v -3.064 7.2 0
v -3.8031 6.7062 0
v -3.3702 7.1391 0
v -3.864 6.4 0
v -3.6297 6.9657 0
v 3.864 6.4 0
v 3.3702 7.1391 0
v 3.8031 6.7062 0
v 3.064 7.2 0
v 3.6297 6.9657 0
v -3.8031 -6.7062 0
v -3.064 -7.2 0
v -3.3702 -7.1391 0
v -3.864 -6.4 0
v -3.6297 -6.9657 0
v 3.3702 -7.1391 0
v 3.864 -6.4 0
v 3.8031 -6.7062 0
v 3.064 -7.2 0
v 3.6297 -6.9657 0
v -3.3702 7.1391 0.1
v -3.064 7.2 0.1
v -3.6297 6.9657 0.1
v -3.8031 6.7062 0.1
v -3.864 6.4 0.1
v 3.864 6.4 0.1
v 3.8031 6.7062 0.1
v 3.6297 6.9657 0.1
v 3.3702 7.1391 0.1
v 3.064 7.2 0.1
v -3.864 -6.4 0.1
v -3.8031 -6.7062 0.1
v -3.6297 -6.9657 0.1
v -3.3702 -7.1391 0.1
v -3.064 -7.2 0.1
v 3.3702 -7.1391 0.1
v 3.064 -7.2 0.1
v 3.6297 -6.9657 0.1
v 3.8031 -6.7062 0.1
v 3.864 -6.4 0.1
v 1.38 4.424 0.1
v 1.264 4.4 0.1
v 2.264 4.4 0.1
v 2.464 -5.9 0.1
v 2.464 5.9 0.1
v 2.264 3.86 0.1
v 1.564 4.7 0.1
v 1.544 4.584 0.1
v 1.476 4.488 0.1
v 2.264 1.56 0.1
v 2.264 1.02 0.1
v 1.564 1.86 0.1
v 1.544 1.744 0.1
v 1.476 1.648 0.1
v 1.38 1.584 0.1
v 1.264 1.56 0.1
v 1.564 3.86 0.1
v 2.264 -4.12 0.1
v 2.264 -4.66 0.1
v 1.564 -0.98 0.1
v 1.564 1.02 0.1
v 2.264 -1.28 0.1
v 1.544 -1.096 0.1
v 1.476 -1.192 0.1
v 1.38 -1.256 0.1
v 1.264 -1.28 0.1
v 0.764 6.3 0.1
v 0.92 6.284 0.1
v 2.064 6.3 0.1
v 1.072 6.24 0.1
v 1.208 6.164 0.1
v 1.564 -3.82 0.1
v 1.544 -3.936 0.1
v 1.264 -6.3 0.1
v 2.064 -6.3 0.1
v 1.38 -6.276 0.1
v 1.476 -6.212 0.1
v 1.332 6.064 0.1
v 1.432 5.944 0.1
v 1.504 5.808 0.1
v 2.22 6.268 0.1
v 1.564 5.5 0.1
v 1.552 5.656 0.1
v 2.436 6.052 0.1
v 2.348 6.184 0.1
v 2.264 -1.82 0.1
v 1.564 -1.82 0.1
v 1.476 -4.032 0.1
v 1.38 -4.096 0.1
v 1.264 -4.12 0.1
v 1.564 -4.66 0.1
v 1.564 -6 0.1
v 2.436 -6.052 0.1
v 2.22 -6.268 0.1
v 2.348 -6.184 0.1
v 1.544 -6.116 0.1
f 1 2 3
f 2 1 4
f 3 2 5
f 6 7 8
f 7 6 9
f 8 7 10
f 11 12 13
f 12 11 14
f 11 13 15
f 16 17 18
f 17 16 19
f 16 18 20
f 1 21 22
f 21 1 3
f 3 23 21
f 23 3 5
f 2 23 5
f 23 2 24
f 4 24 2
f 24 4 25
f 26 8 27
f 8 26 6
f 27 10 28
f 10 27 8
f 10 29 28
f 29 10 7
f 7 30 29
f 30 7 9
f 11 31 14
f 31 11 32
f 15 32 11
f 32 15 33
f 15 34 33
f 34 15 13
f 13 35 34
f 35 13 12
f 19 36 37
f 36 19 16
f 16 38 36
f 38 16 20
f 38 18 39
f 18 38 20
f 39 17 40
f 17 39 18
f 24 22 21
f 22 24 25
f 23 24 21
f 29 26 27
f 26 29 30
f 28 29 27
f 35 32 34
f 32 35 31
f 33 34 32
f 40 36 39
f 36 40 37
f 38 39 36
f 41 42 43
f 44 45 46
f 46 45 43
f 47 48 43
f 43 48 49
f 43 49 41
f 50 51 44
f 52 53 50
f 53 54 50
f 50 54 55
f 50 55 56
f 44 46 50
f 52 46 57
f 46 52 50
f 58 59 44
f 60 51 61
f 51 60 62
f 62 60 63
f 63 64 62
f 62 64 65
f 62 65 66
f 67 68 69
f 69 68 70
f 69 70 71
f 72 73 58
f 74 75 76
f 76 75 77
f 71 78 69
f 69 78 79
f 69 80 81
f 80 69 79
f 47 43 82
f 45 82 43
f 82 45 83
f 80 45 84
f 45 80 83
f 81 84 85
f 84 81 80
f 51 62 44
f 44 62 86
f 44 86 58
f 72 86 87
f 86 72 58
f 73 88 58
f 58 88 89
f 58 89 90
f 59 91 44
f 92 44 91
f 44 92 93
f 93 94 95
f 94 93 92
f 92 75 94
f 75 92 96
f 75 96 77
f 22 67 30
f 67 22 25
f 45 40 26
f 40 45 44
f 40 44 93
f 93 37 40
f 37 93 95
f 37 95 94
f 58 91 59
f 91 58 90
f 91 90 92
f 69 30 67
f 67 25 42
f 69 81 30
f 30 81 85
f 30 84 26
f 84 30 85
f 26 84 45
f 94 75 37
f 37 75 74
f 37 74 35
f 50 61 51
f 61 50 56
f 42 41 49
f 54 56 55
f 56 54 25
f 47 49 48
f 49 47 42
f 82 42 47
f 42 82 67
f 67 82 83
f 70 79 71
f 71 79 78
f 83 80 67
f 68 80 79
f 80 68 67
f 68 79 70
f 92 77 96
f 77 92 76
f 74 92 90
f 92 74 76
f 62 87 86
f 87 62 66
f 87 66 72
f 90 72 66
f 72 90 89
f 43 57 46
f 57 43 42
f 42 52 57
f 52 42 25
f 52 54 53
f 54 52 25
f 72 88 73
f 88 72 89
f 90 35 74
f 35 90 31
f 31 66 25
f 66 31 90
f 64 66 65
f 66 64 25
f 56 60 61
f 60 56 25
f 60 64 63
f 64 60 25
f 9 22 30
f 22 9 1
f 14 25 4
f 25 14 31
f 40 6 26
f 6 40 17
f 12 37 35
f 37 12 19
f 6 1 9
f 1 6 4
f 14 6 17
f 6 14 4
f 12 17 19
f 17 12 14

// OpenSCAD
// file: ../p/4-4edge.scad
use <../lib.scad>
$fa=1; $fs=0.2;
function ldraw_lib__4_4edge(realsolid=false) = [
// 0 Circle 1.0
// 0 Name: 4-4edge.dat
// 0 Author: James Jessiman
// 0 !LDRAW_ORG Primitive UPDATE 2017-01
// 0 !LICENSE Licensed under CC BY 2.0 and CC BY 4.0 : see CAreadme.txt
// 
// 0 BFC CERTIFY CCW
  [0,"BFC","CERTIFY"],
  [0,"BFC","CCW"],
// 
// 0 !HISTORY 1998-12-15 [PTadmin] Official Update 1998-10
// 0 !HISTORY 2005-12-28 [PTadmin] Official Update 2005-01
// 0 !HISTORY 2007-06-24 [PTadmin] Header formatted for Contributor Agreement
// 0 !HISTORY 2008-07-01 [PTadmin] Official Update 2008-01
// 0 !HISTORY 2017-01-15 [Steffen] BFCed
// 0 !HISTORY 2017-12-30 [PTadmin] Official Update 2017-01
// 
// 
// 2 24 1 0 0 0.9239 0 0.3827
  [2,24,1,0,0,0.9239,0,0.3827],
// 2 24 0.9239 0 0.3827 0.7071 0 0.7071
  [2,24,0.9239,0,0.3827,0.7071,0,0.7071],
// 2 24 0.7071 0 0.7071 0.3827 0 0.9239
  [2,24,0.7071,0,0.7071,0.3827,0,0.9239],
// 2 24 0.3827 0 0.9239 0 0 1
  [2,24,0.3827,0,0.9239,0,0,1],
// 2 24 0 0 1 -0.3827 0 0.9239
  [2,24,0,0,1,-0.3827,0,0.9239],
// 2 24 -0.3827 0 0.9239 -0.7071 0 0.7071
  [2,24,-0.3827,0,0.9239,-0.7071,0,0.7071],
// 2 24 -0.7071 0 0.7071 -0.9239 0 0.3827
  [2,24,-0.7071,0,0.7071,-0.9239,0,0.3827],
// 2 24 -0.9239 0 0.3827 -1 0 -0
  [2,24,-0.9239,0,0.3827,-1,0,-0],
// 2 24 -1 0 -0 -0.9239 0 -0.3827
  [2,24,-1,0,-0,-0.9239,0,-0.3827],
// 2 24 -0.9239 0 -0.3827 -0.7071 0 -0.7071
  [2,24,-0.9239,0,-0.3827,-0.7071,0,-0.7071],
// 2 24 -0.7071 0 -0.7071 -0.3827 0 -0.9239
  [2,24,-0.7071,0,-0.7071,-0.3827,0,-0.9239],
// 2 24 -0.3827 0 -0.9239 0 0 -1
  [2,24,-0.3827,0,-0.9239,0,0,-1],
// 2 24 0 0 -1 0.3827 0 -0.9239
  [2,24,0,0,-1,0.3827,0,-0.9239],
// 2 24 0.3827 0 -0.9239 0.7071 0 -0.7071
  [2,24,0.3827,0,-0.9239,0.7071,0,-0.7071],
// 2 24 0.7071 0 -0.7071 0.9239 0 -0.3827
  [2,24,0.7071,0,-0.7071,0.9239,0,-0.3827],
// 2 24 0.9239 0 -0.3827 1 0 0
  [2,24,0.9239,0,-0.3827,1,0,0],
];
module ldraw_lib__4_4edge(step=0, col=false, unit=2/5, alt=false, line=0.2, solid=!$preview)
    makepoly(ldraw_lib__4_4edge(solid), step=step, col=col, unit=unit, alt=alt, line=line, solid=solid);
ldraw_lib__4_4edge(line=0.2);
// file: ../p/4-4disc.scad
use <../lib.scad>
$fa=1; $fs=0.2;
function ldraw_lib__4_4disc(realsolid=false) = [
// 0 Disc 1.0
// 0 Name: 4-4disc.dat
// 0 Author: James Jessiman
// 0 !LDRAW_ORG Primitive UPDATE 2002-02
// 0 !LICENSE Licensed under CC BY 2.0 and CC BY 4.0 : see CAreadme.txt
// 
// 0 BFC CERTIFY CCW
  [0,"BFC","CERTIFY"],
  [0,"BFC","CCW"],
// 
// 0 !HISTORY 1998-12-15 [PTadmin] Official Update 1998-10
// 0 !HISTORY 2002-03-23 [sbliss] Added BFC statement
// 0 !HISTORY 2002-04-25 [PTadmin] Official Update 2002-02
// 0 !HISTORY 2007-06-24 [PTadmin] Header formatted for Contributor Agreement
// 0 !HISTORY 2008-07-01 [PTadmin] Official Update 2008-01
// 
// 
// 3 16 0 0 0 1 0 0 0.9239 0 0.3827
  [3,16,0,0,0,1,0,0,0.9239,0,0.3827],
// 3 16 0 0 0 0.9239 0 0.3827 0.7071 0 0.7071
  [3,16,0,0,0,0.9239,0,0.3827,0.7071,0,0.7071],
// 3 16 0 0 0 0.7071 0 0.7071 0.3827 0 0.9239
  [3,16,0,0,0,0.7071,0,0.7071,0.3827,0,0.9239],
// 3 16 0 0 0 0.3827 0 0.9239 0 0 1
  [3,16,0,0,0,0.3827,0,0.9239,0,0,1],
// 3 16 0 0 0 0 0 1 -0.3827 0 0.9239
  [3,16,0,0,0,0,0,1,-0.3827,0,0.9239],
// 3 16 0 0 0 -0.3827 0 0.9239 -0.7071 0 0.7071
  [3,16,0,0,0,-0.3827,0,0.9239,-0.7071,0,0.7071],
// 3 16 0 0 0 -0.7071 0 0.7071 -0.9239 0 0.3827
  [3,16,0,0,0,-0.7071,0,0.7071,-0.9239,0,0.3827],
// 3 16 0 0 0 -0.9239 0 0.3827 -1 0 -0
  [3,16,0,0,0,-0.9239,0,0.3827,-1,0,-0],
// 3 16 0 0 0 -1 0 -0 -0.9239 0 -0.3827
  [3,16,0,0,0,-1,0,-0,-0.9239,0,-0.3827],
// 3 16 0 0 0 -0.9239 0 -0.3827 -0.7071 0 -0.7071
  [3,16,0,0,0,-0.9239,0,-0.3827,-0.7071,0,-0.7071],
// 3 16 0 0 0 -0.7071 0 -0.7071 -0.3827 0 -0.9239
  [3,16,0,0,0,-0.7071,0,-0.7071,-0.3827,0,-0.9239],
// 3 16 0 0 0 -0.3827 0 -0.9239 0 0 -1
  [3,16,0,0,0,-0.3827,0,-0.9239,0,0,-1],
// 3 16 0 0 0 0 0 -1 0.3827 0 -0.9239
  [3,16,0,0,0,0,0,-1,0.3827,0,-0.9239],
// 3 16 0 0 0 0.3827 0 -0.9239 0.7071 0 -0.7071
  [3,16,0,0,0,0.3827,0,-0.9239,0.7071,0,-0.7071],
// 3 16 0 0 0 0.7071 0 -0.7071 0.9239 0 -0.3827
  [3,16,0,0,0,0.7071,0,-0.7071,0.9239,0,-0.3827],
// 3 16 0 0 0 0.9239 0 -0.3827 1 0 0
  [3,16,0,0,0,0.9239,0,-0.3827,1,0,0],
// 0
];
module ldraw_lib__4_4disc(step=0, col=false, unit=2/5, alt=false, line=0.2, solid=!$preview)
    makepoly(ldraw_lib__4_4disc(solid), step=step, col=col, unit=unit, alt=alt, line=line, solid=solid);
ldraw_lib__4_4disc(line=0.2);
// file: ../p/4-4cyli.scad
use <../lib.scad>
$fa=1; $fs=0.2;
function ldraw_lib__4_4cyli(realsolid=false) = [
// 0 Cylinder 1.0
// 0 Name: 4-4cyli.dat
// 0 Author: James Jessiman
// 0 !LDRAW_ORG Primitive UPDATE 2005-01
// 0 !LICENSE Licensed under CC BY 2.0 and CC BY 4.0 : see CAreadme.txt
// 
// 0 BFC CERTIFY CCW
  [0,"BFC","CERTIFY"],
  [0,"BFC","CCW"],
// 
// 0 !HISTORY 1998-12-15 [PTadmin] Official Update 1998-10
// 0 !HISTORY 2002-03-23 [sbliss] Added BFC statement; merged headers from files in distributions LDraw 0.27 and Complete.
// 0 !HISTORY 2002-04-25 [PTadmin] Official Update 2002-02
// 0 !HISTORY 2004-12-14 [guyvivan] BFC CCW
// 0 !HISTORY 2005-12-28 [PTadmin] Official Update 2005-01
// 0 !HISTORY 2007-06-24 [PTadmin] Header formatted for Contributor Agreement
// 0 !HISTORY 2008-07-01 [PTadmin] Official Update 2008-01
// 
// 
// 4 16 1 1 0 0.9239 1 0.3827 0.9239 0 0.3827 1 0 0
  [4,16,1,1,0,0.9239,1,0.3827,0.9239,0,0.3827,1,0,0],
// 5 24 1 0 0 1 1 0 0.9239 0 0.3827 0.9239 0 -0.3827
  [5,24,1,0,0,1,1,0,0.9239,0,0.3827,0.9239,0,-0.3827],
// 4 16 0.9239 1 0.3827 0.7071 1 0.7071 0.7071 0 0.7071 0.9239 0 0.3827
  [4,16,0.9239,1,0.3827,0.7071,1,0.7071,0.7071,0,0.7071,0.9239,0,0.3827],
// 5 24 0.9239 0 0.3827 0.9239 1 0.3827 0.7071 0 0.7071 1 0 0
  [5,24,0.9239,0,0.3827,0.9239,1,0.3827,0.7071,0,0.7071,1,0,0],
// 4 16 0.7071 1 0.7071 0.3827 1 0.9239 0.3827 0 0.9239 0.7071 0 0.7071
  [4,16,0.7071,1,0.7071,0.3827,1,0.9239,0.3827,0,0.9239,0.7071,0,0.7071],
// 5 24 0.7071 0 0.7071 0.7071 1 0.7071 0.3827 0 0.9239 0.9239 0 0.3827
  [5,24,0.7071,0,0.7071,0.7071,1,0.7071,0.3827,0,0.9239,0.9239,0,0.3827],
// 4 16 0.3827 1 0.9239 0 1 1 0 0 1 0.3827 0 0.9239
  [4,16,0.3827,1,0.9239,0,1,1,0,0,1,0.3827,0,0.9239],
// 5 24 0.3827 0 0.9239 0.3827 1 0.9239 0 0 1 0.7071 0 0.7071
  [5,24,0.3827,0,0.9239,0.3827,1,0.9239,0,0,1,0.7071,0,0.7071],
// 4 16 0 1 1 -0.3827 1 0.9239 -0.3827 0 0.9239 0 0 1
  [4,16,0,1,1,-0.3827,1,0.9239,-0.3827,0,0.9239,0,0,1],
// 5 24 0 0 1 0 1 1 -0.3827 0 0.9239 0.3827 0 0.9239
  [5,24,0,0,1,0,1,1,-0.3827,0,0.9239,0.3827,0,0.9239],
// 4 16 -0.3827 1 0.9239 -0.7071 1 0.7071 -0.7071 0 0.7071 -0.3827 0 0.9239
  [4,16,-0.3827,1,0.9239,-0.7071,1,0.7071,-0.7071,0,0.7071,-0.3827,0,0.9239],
// 5 24 -0.3827 0 0.9239 -0.3827 1 0.9239 -0.7071 0 0.7071 0 0 1
  [5,24,-0.3827,0,0.9239,-0.3827,1,0.9239,-0.7071,0,0.7071,0,0,1],
// 4 16 -0.7071 1 0.7071 -0.9239 1 0.3827 -0.9239 0 0.3827 -0.7071 0 0.7071
  [4,16,-0.7071,1,0.7071,-0.9239,1,0.3827,-0.9239,0,0.3827,-0.7071,0,0.7071],
// 5 24 -0.7071 0 0.7071 -0.7071 1 0.7071 -0.9239 0 0.3827 -0.3827 0 0.9239
  [5,24,-0.7071,0,0.7071,-0.7071,1,0.7071,-0.9239,0,0.3827,-0.3827,0,0.9239],
// 4 16 -0.9239 1 0.3827 -1 1 0 -1 0 0 -0.9239 0 0.3827
  [4,16,-0.9239,1,0.3827,-1,1,0,-1,0,0,-0.9239,0,0.3827],
// 5 24 -0.9239 0 0.3827 -0.9239 1 0.3827 -1 0 0 -0.7071 0 0.7071
  [5,24,-0.9239,0,0.3827,-0.9239,1,0.3827,-1,0,0,-0.7071,0,0.7071],
// 4 16 -1 1 0 -0.9239 1 -0.3827 -0.9239 0 -0.3827 -1 0 0
  [4,16,-1,1,0,-0.9239,1,-0.3827,-0.9239,0,-0.3827,-1,0,0],
// 5 24 -1 0 0 -1 1 0 -0.9239 0 -0.3827 -0.9239 0 0.3827
  [5,24,-1,0,0,-1,1,0,-0.9239,0,-0.3827,-0.9239,0,0.3827],
// 4 16 -0.9239 1 -0.3827 -0.7071 1 -0.7071 -0.7071 0 -0.7071 -0.9239 0 -0.3827
  [4,16,-0.9239,1,-0.3827,-0.7071,1,-0.7071,-0.7071,0,-0.7071,-0.9239,0,-0.3827],
// 5 24 -0.9239 0 -0.3827 -0.9239 1 -0.3827 -0.7071 0 -0.7071 -1 0 0
  [5,24,-0.9239,0,-0.3827,-0.9239,1,-0.3827,-0.7071,0,-0.7071,-1,0,0],
// 4 16 -0.7071 1 -0.7071 -0.3827 1 -0.9239 -0.3827 0 -0.9239 -0.7071 0 -0.7071
  [4,16,-0.7071,1,-0.7071,-0.3827,1,-0.9239,-0.3827,0,-0.9239,-0.7071,0,-0.7071],
// 5 24 -0.7071 0 -0.7071 -0.7071 1 -0.7071 -0.3827 0 -0.9239 -0.9239 0 -0.3827
  [5,24,-0.7071,0,-0.7071,-0.7071,1,-0.7071,-0.3827,0,-0.9239,-0.9239,0,-0.3827],
// 4 16 -0.3827 1 -0.9239 0 1 -1 0 0 -1 -0.3827 0 -0.9239
  [4,16,-0.3827,1,-0.9239,0,1,-1,0,0,-1,-0.3827,0,-0.9239],
// 5 24 -0.3827 0 -0.9239 -0.3827 1 -0.9239 0 0 -1 -0.7071 0 -0.7071
  [5,24,-0.3827,0,-0.9239,-0.3827,1,-0.9239,0,0,-1,-0.7071,0,-0.7071],
// 4 16 0 1 -1 0.3827 1 -0.9239 0.3827 0 -0.9239 0 0 -1
  [4,16,0,1,-1,0.3827,1,-0.9239,0.3827,0,-0.9239,0,0,-1],
// 5 24 0 0 -1 0 1 -1 0.3827 0 -0.9239 -0.3827 0 -0.9239
  [5,24,0,0,-1,0,1,-1,0.3827,0,-0.9239,-0.3827,0,-0.9239],
// 4 16 0.3827 1 -0.9239 0.7071 1 -0.7071 0.7071 0 -0.7071 0.3827 0 -0.9239
  [4,16,0.3827,1,-0.9239,0.7071,1,-0.7071,0.7071,0,-0.7071,0.3827,0,-0.9239],
// 5 24 0.3827 0 -0.9239 0.3827 1 -0.9239 0.7071 0 -0.7071 0 0 -1
  [5,24,0.3827,0,-0.9239,0.3827,1,-0.9239,0.7071,0,-0.7071,0,0,-1],
// 4 16 0.7071 1 -0.7071 0.9239 1 -0.3827 0.9239 0 -0.3827 0.7071 0 -0.7071
  [4,16,0.7071,1,-0.7071,0.9239,1,-0.3827,0.9239,0,-0.3827,0.7071,0,-0.7071],
// 5 24 0.7071 0 -0.7071 0.7071 1 -0.7071 0.9239 0 -0.3827 0.3827 0 -0.9239
  [5,24,0.7071,0,-0.7071,0.7071,1,-0.7071,0.9239,0,-0.3827,0.3827,0,-0.9239],
// 4 16 0.9239 1 -0.3827 1 1 0 1 0 0 0.9239 0 -0.3827
  [4,16,0.9239,1,-0.3827,1,1,0,1,0,0,0.9239,0,-0.3827],
// 5 24 0.9239 0 -0.3827 0.9239 1 -0.3827 1 0 0 0.7071 0 -0.7071
  [5,24,0.9239,0,-0.3827,0.9239,1,-0.3827,1,0,0,0.7071,0,-0.7071],
// 0
];
module ldraw_lib__4_4cyli(step=0, col=false, unit=2/5, alt=false, line=0.2, solid=!$preview)
    makepoly(ldraw_lib__4_4cyli(solid), step=step, col=col, unit=unit, alt=alt, line=line, solid=solid);
ldraw_lib__4_4cyli(line=0.2);
// file: ../p/stud3.scad
use <../lib.scad>
use <4-4cyli.scad>
use <4-4disc.scad>
use <4-4edge.scad>
$fa=1; $fs=0.2;
function ldraw_lib__stud3(realsolid=false) = realsolid ? 
    [openscad(translate([0,0,-eps()], o=cylinder(4+eps(), r=4)),2)] : [
// 0 Stud Tube Solid
// 0 Name: stud3.dat
// 0 Author: James Jessiman
// 0 !LDRAW_ORG Primitive UPDATE 2012-01
// 0 !LICENSE Licensed under CC BY 2.0 and CC BY 4.0 : see CAreadme.txt
// 
// 0 BFC CERTIFY CCW
  [0,"BFC","CERTIFY"],
  [0,"BFC","CCW"],
// 
// 0 !HISTORY 2002-04-04 [sbliss] Modified for BFC compliance
// 0 !HISTORY 2002-04-25 [PTadmin] Official Update 2002-02
// 0 !HISTORY 2007-06-24 [PTadmin] Header formatted for Contributor Agreement
// 0 !HISTORY 2008-07-01 [PTadmin] Official Update 2008-01
// 0 !HISTORY 2012-02-16 [Philo] Changed to CCW
// 0 !HISTORY 2012-03-30 [PTadmin] Official Update 2012-01
// 
// 
// 1 16 0 -4 0 4 0 0 0 1 0 0 0 4 4-4edge.dat
  [1,16,0,-4,0,4,0,0,0,1,0,0,0,4, ldraw_lib__4_4edge(realsolid)],
// 1 16 0 0 0 4 0 0 0 1 0 0 0 4 4-4edge.dat
  [1,16,0,0,0,4,0,0,0,1,0,0,0,4, ldraw_lib__4_4edge(realsolid)],
// 1 16 0 -4 0 4 0 0 0 1 0 0 0 4 4-4disc.dat
  [1,16,0,-4,0,4,0,0,0,1,0,0,0,4, ldraw_lib__4_4disc(realsolid)],
// 1 16 0 -4 0 4 0 0 0 4 0 0 0 4 4-4cyli.dat
  [1,16,0,-4,0,4,0,0,0,4,0,0,0,4, ldraw_lib__4_4cyli(realsolid)],
];
module ldraw_lib__stud3(step=0, col=false, unit=2/5, alt=false, line=0.2, solid=!$preview)
    makepoly(ldraw_lib__stud3(solid), step=step, col=col, unit=unit, alt=alt, line=line, solid=solid);
ldraw_lib__stud3(line=0.2);
// file: ../p/stud.scad
use <../lib.scad>
use <4-4cyli.scad>
use <4-4disc.scad>
use <4-4edge.scad>
$fa=1; $fs=0.2;
function ldraw_lib__stud(realsolid=false) = realsolid ? 
    [openscad(translate([0,0,-eps()], o=cylinder(4+eps(), r=6)),2)] : [
// 0 Stud
// 0 Name: stud.dat
// 0 Author: James Jessiman
// 0 !LDRAW_ORG Primitive UPDATE 2012-01
// 0 !LICENSE Licensed under CC BY 2.0 and CC BY 4.0 : see CAreadme.txt
// 
// 0 BFC CERTIFY CCW
  [0,"BFC","CERTIFY"],
  [0,"BFC","CCW"],
// 
// 0 !HISTORY 2002-04-04 [sbliss] Modified for BFC compliance
// 0 !HISTORY 2002-04-25 [PTadmin] Official Update 2002-02
// 0 !HISTORY 2007-06-24 [PTadmin] Header formatted for Contributor Agreement
// 0 !HISTORY 2008-07-01 [PTadmin] Official Update 2008-01
// 0 !HISTORY 2012-02-16 [Philo] Changed to CCW
// 0 !HISTORY 2012-03-30 [PTadmin] Official Update 2012-01
// 
// 
// 1 16 0 0 0 6 0 0 0 1 0 0 0 6 4-4edge.dat
  [1,16,0,0,0,6,0,0,0,1,0,0,0,6, ldraw_lib__4_4edge(realsolid)],
// 1 16 0 -4 0 6 0 0 0 1 0 0 0 6 4-4edge.dat
  [1,16,0,-4,0,6,0,0,0,1,0,0,0,6, ldraw_lib__4_4edge(realsolid)],
// 1 16 0 0 0 6 0 0 0 -4 0 0 0 6 4-4cyli.dat
  [1,16,0,0,0,6,0,0,0,-4,0,0,0,6, ldraw_lib__4_4cyli(realsolid)],
// 1 16 0 -4 0 6 0 0 0 1 0 0 0 6 4-4disc.dat
  [1,16,0,-4,0,6,0,0,0,1,0,0,0,6, ldraw_lib__4_4disc(realsolid)],
];
module ldraw_lib__stud(step=0, col=false, unit=2/5, alt=false, line=0.2, solid=!$preview)
    makepoly(ldraw_lib__stud(solid), step=step, col=col, unit=unit, alt=alt, line=line, solid=solid);
ldraw_lib__stud(line=0.2);
// file: ../p/box5.scad
use <../lib.scad>
$fa=1; $fs=0.2;
function ldraw_lib__box5(realsolid=false) = [
// 0 Box with 5 Faces and All Edges
// 0 Name: box5.dat
// 0 Author: James Jessiman
// 0 !LDRAW_ORG Primitive UPDATE 2012-01
// 0 !LICENSE Licensed under CC BY 2.0 and CC BY 4.0 : see CAreadme.txt
// 
// 0 BFC CERTIFY CCW
  [0,"BFC","CERTIFY"],
  [0,"BFC","CCW"],
// 
// 0 !HISTORY 2002-04-03 [sbliss] Modified for BFC compliance
// 0 !HISTORY 2002-04-25 [PTadmin] Official Update 2002-02
// 0 !HISTORY 2007-06-24 [PTadmin] Header formatted for Contributor Agreement
// 0 !HISTORY 2008-07-01 [PTadmin] Official Update 2008-01
// 0 !HISTORY 2012-02-16 [Philo] Changed to CCW
// 0 !HISTORY 2012-03-30 [PTadmin] Official Update 2012-01
// 
// 
// 2 24 1 1 1 -1 1 1
  [2,24,1,1,1,-1,1,1],
// 2 24 -1 1 1 -1 1 -1
  [2,24,-1,1,1,-1,1,-1],
// 2 24 -1 1 -1 1 1 -1
  [2,24,-1,1,-1,1,1,-1],
// 2 24 1 1 -1 1 1 1
  [2,24,1,1,-1,1,1,1],
// 2 24 1 0 1 -1 0 1
  [2,24,1,0,1,-1,0,1],
// 2 24 -1 0 1 -1 0 -1
  [2,24,-1,0,1,-1,0,-1],
// 2 24 -1 0 -1 1 0 -1
  [2,24,-1,0,-1,1,0,-1],
// 2 24 1 0 -1 1 0 1
  [2,24,1,0,-1,1,0,1],
// 2 24 1 0 1 1 1 1
  [2,24,1,0,1,1,1,1],
// 2 24 -1 0 1 -1 1 1
  [2,24,-1,0,1,-1,1,1],
// 2 24 1 0 -1 1 1 -1
  [2,24,1,0,-1,1,1,-1],
// 2 24 -1 0 -1 -1 1 -1
  [2,24,-1,0,-1,-1,1,-1],
// 4 16 -1 1 1 1 1 1 1 1 -1 -1 1 -1
  [4,16,-1,1,1,1,1,1,1,1,-1,-1,1,-1],
// 4 16 -1 1 1 -1 0 1 1 0 1 1 1 1
  [4,16,-1,1,1,-1,0,1,1,0,1,1,1,1],
// 4 16 -1 1 -1 -1 0 -1 -1 0 1 -1 1 1
  [4,16,-1,1,-1,-1,0,-1,-1,0,1,-1,1,1],
// 4 16 1 1 -1 1 0 -1 -1 0 -1 -1 1 -1
  [4,16,1,1,-1,1,0,-1,-1,0,-1,-1,1,-1],
// 4 16 1 1 1 1 0 1 1 0 -1 1 1 -1
  [4,16,1,1,1,1,0,1,1,0,-1,1,1,-1],
];
module ldraw_lib__box5(step=0, col=false, unit=2/5, alt=false, line=0.2, solid=!$preview)
    makepoly(ldraw_lib__box5(solid), step=step, col=col, unit=unit, alt=alt, line=line, solid=solid);
ldraw_lib__box5(line=0.2);
// file: ../p/box4t.scad
use <../lib.scad>
$fa=1; $fs=0.2;
function ldraw_lib__box4t(realsolid=false) = [
// 0 Box with 4 Adjacent Faces and All Edges
// 0 Name: box4t.dat
// 0 Author: Tore Eriksson [Tore_Eriksson]
// 0 !LDRAW_ORG Primitive UPDATE 2003-02
// 0 !LICENSE Licensed under CC BY 2.0 and CC BY 4.0 : see CAreadme.txt
// 
// 0 BFC CERTIFY CCW
  [0,"BFC","CERTIFY"],
  [0,"BFC","CCW"],
// 
// 0 !HISTORY 1997-09-29 [PTadmin] Official Update 1997-15
// 0 !HISTORY 2002-08-31 [izanette] Modified with WINDZ for BFC compliance
// 0 !HISTORY 2003-08-01 [PTadmin] Official Update 2003-02
// 0 !HISTORY 2007-06-24 [PTadmin] Header formatted for Contributor Agreement
// 0 !HISTORY 2008-07-01 [PTadmin] Official Update 2008-01
// 
// 
// 2 24 1 1 1 -1 1 1
  [2,24,1,1,1,-1,1,1],
// 2 24 -1 1 1 -1 1 -1
  [2,24,-1,1,1,-1,1,-1],
// 2 24 -1 1 -1 1 1 -1
  [2,24,-1,1,-1,1,1,-1],
// 2 24 1 1 -1 1 1 1
  [2,24,1,1,-1,1,1,1],
// 2 24 1 0 1 -1 0 1
  [2,24,1,0,1,-1,0,1],
// 2 24 -1 0 1 -1 0 -1
  [2,24,-1,0,1,-1,0,-1],
// 2 24 -1 0 -1 1 0 -1
  [2,24,-1,0,-1,1,0,-1],
// 2 24 1 0 -1 1 0 1
  [2,24,1,0,-1,1,0,1],
// 2 24 1 0 1 1 1 1
  [2,24,1,0,1,1,1,1],
// 2 24 -1 0 1 -1 1 1
  [2,24,-1,0,1,-1,1,1],
// 2 24 1 0 -1 1 1 -1
  [2,24,1,0,-1,1,1,-1],
// 2 24 -1 0 -1 -1 1 -1
  [2,24,-1,0,-1,-1,1,-1],
// 4 16 1 1 1 1 1 -1 -1 1 -1 -1 1 1
  [4,16,1,1,1,1,1,-1,-1,1,-1,-1,1,1],
// 4 16 1 1 1 -1 1 1 -1 0 1 1 0 1
  [4,16,1,1,1,-1,1,1,-1,0,1,1,0,1],
// 4 16 -1 1 1 -1 1 -1 -1 0 -1 -1 0 1
  [4,16,-1,1,1,-1,1,-1,-1,0,-1,-1,0,1],
// 0 4 16 -1 1 -1 -1 0 -1 1 0 -1 1 1 -1
// 4 16 1 1 -1 1 1 1 1 0 1 1 0 -1
  [4,16,1,1,-1,1,1,1,1,0,1,1,0,-1],
// 0
];
module ldraw_lib__box4t(step=0, col=false, unit=2/5, alt=false, line=0.2, solid=!$preview)
    makepoly(ldraw_lib__box4t(solid), step=step, col=col, unit=unit, alt=alt, line=line, solid=solid);
ldraw_lib__box4t(line=0.2);
// file: s/3004s01.scad
use <../../lib.scad>
use <../../p/box4t.scad>
use <../../p/box5.scad>
use <../../p/stud.scad>
use <../../p/stud3.scad>
$fa=1; $fs=0.2;
function ldraw_lib__s__3004s01(realsolid=false) = [
// 0 ~Brick  1 x  2 without Front Face
// 0 Name: s\3004s01.dat
// 0 Author: James Jessiman
// 0 !LDRAW_ORG Subpart UPDATE 2003-03
// 0 !LICENSE Licensed under CC BY 2.0 and CC BY 4.0 : see CAreadme.txt
// 
// 0 BFC CERTIFY CCW
  [0,"BFC","CERTIFY"],
  [0,"BFC","CCW"],
// 
// 0 !HISTORY 2003-09-07 [jriley] Subfiling, BFC
// 0 !HISTORY 2003-12-19 [PTadmin] Official Update 2003-03
// 0 !HISTORY 2007-08-29 [PTadmin] Header formatted for Contributor Agreement
// 0 !HISTORY 2008-07-01 [PTadmin] Official Update 2008-01
// 
// 
// 1 16 0 4 0 1 0 0 0 -5 0 0 0 1 stud3.dat
  [1,16,0,4,0,1,0,0,0,-5,0,0,0,1, ldraw_lib__stud3(realsolid)],
// 0 BFC INVERTNEXT
  [0,"BFC","INVERTNEXT"],
// 1 16 0 24 0 16 0 0 0 -20 0 0 0 6 box5.dat
  [1,16,0,24,0,16,0,0,0,-20,0,0,0,6, ldraw_lib__box5(realsolid)],
// 4 16 20 24 10 16 24 6 -16 24 6 -20 24 10
  [4,16,20,24,10,16,24,6,-16,24,6,-20,24,10],
// 4 16 -20 24 10 -16 24 6 -16 24 -6 -20 24 -10
  [4,16,-20,24,10,-16,24,6,-16,24,-6,-20,24,-10],
// 4 16 -20 24 -10 -16 24 -6 16 24 -6 20 24 -10
  [4,16,-20,24,-10,-16,24,-6,16,24,-6,20,24,-10],
// 4 16 20 24 -10 16 24 -6 16 24 6 20 24 10
  [4,16,20,24,-10,16,24,-6,16,24,6,20,24,10],
// 1 16 0 24 0 20 0 0 0 -24 0 0 0 10 box4t.dat
  [1,16,0,24,0,20,0,0,0,-24,0,0,0,10, ldraw_lib__box4t(realsolid)],
// 1 16 10 0 0 1 0 0 0 1 0 0 0 1 stud.dat
  [1,16,10,0,0,1,0,0,0,1,0,0,0,1, ldraw_lib__stud(realsolid)],
// 1 16 -10 0 0 1 0 0 0 1 0 0 0 1 stud.dat
  [1,16,-10,0,0,1,0,0,0,1,0,0,0,1, ldraw_lib__stud(realsolid)],
// 0
];
module ldraw_lib__s__3004s01(step=0, col=false, unit=2/5, alt=false, line=0.2, solid=!$preview)
    makepoly(ldraw_lib__s__3004s01(solid), step=step, col=col, unit=unit, alt=alt, line=line, solid=solid);
ldraw_lib__s__3004s01(line=0.2);
// file: 3004.scad
use <../lib.scad>
use <s/3004s01.scad>
$fa=1; $fs=0.2;
function ldraw_lib__3004(realsolid=false) = [
// 0 Brick  1 x  2
// 0 Name: 3004.dat
// 0 Author: James Jessiman
// 0 !LDRAW_ORG Part UPDATE 2022-05
// 0 !LICENSE Licensed under CC BY 2.0 and CC BY 4.0 : see CAreadme.txt
// 
// 0 BFC CERTIFY CCW
  [0,"BFC","CERTIFY"],
  [0,"BFC","CCW"],
// 
// 0 !HISTORY 2001-10-26 [PTadmin] Official Update 2001-01
// 0 !HISTORY 2002-05-07 {unknown} BFC Certification
// 0 !HISTORY 2002-06-11 [PTadmin] Official Update 2002-03
// 0 !HISTORY 2007-05-07 [PTadmin] Header formatted for Contributor Agreement
// 0 !HISTORY 2008-07-01 [PTadmin] Official Update 2008-01
// 0 !HISTORY 2022-08-04 [MagFors] Using subfile
// 0 !HISTORY 2022-09-15 [PTadmin] Official Update 2022-05
// 
// 
// 1 16 0 0 0 1 0 0 0 1 0 0 0 1 s\3004s01.dat
  [1,16,0,0,0,1,0,0,0,1,0,0,0,1, ldraw_lib__s__3004s01(realsolid)],
// 4 16 -20 24 -10 20 24 -10 20 0 -10 -20 0 -10
  [4,16,-20,24,-10,20,24,-10,20,0,-10,-20,0,-10],
];
module ldraw_lib__3004(step=0, col=false, unit=2/5, alt=false, line=0.2, solid=!$preview)
    makepoly(ldraw_lib__3004(solid), step=step, col=col, unit=unit, alt=alt, line=line, solid=solid);
ldraw_lib__3004(line=0.2);
// file: ../p/1-4cyli.scad
use <../lib.scad>
$fa=1; $fs=0.2;
function ldraw_lib__1_4cyli(realsolid=false) = [
// 0 Cylinder 0.25
// 0 Name: 1-4cyli.dat
// 0 Author: James Jessiman
// 0 !LDRAW_ORG Primitive UPDATE 2012-01
// 0 !LICENSE Licensed under CC BY 2.0 and CC BY 4.0 : see CAreadme.txt
// 
// 0 BFC CERTIFY CCW
  [0,"BFC","CERTIFY"],
  [0,"BFC","CCW"],
// 
// 0 !HISTORY 2002-03-23 [sbliss] Added BFC statement.
// 0 !HISTORY 2002-04-25 [PTadmin] Official Update 2002-02
// 0 !HISTORY 2007-06-22 [PTadmin] Header formatted for Contributor Agreement
// 0 !HISTORY 2008-07-01 [PTadmin] Official Update 2008-01
// 0 !HISTORY 2012-02-16 [Philo] Changed to CCW
// 0 !HISTORY 2012-03-30 [PTadmin] Official Update 2012-01
// 
// 
// 4 16 1 1 0 0.9239 1 0.3827 0.9239 0 0.3827 1 0 0
  [4,16,1,1,0,0.9239,1,0.3827,0.9239,0,0.3827,1,0,0],
// 5 24 1 0 0 1 1 0 0.9239 0 0.3827 1 0 -1
  [5,24,1,0,0,1,1,0,0.9239,0,0.3827,1,0,-1],
// 4 16 0.9239 1 0.3827 0.7071 1 0.7071 0.7071 0 0.7071 0.9239 0 0.3827
  [4,16,0.9239,1,0.3827,0.7071,1,0.7071,0.7071,0,0.7071,0.9239,0,0.3827],
// 5 24 0.9239 0 0.3827 0.9239 1 0.3827 0.7071 0 0.7071 1 0 0
  [5,24,0.9239,0,0.3827,0.9239,1,0.3827,0.7071,0,0.7071,1,0,0],
// 4 16 0.7071 1 0.7071 0.3827 1 0.9239 0.3827 0 0.9239 0.7071 0 0.7071
  [4,16,0.7071,1,0.7071,0.3827,1,0.9239,0.3827,0,0.9239,0.7071,0,0.7071],
// 5 24 0.7071 0 0.7071 0.7071 1 0.7071 0.3827 0 0.9239 0.9239 0 0.3827
  [5,24,0.7071,0,0.7071,0.7071,1,0.7071,0.3827,0,0.9239,0.9239,0,0.3827],
// 4 16 0.3827 1 0.9239 0 1 1 0 0 1 0.3827 0 0.9239
  [4,16,0.3827,1,0.9239,0,1,1,0,0,1,0.3827,0,0.9239],
// 5 24 0.3827 0 0.9239 0.3827 1 0.9239 0 0 1 0.7071 0 0.7071
  [5,24,0.3827,0,0.9239,0.3827,1,0.9239,0,0,1,0.7071,0,0.7071],
// 5 24 0 0 1 0 1 1 0.3827 0 0.9239 -1 0 1
  [5,24,0,0,1,0,1,1,0.3827,0,0.9239,-1,0,1],
];
module ldraw_lib__1_4cyli(step=0, col=false, unit=2/5, alt=false, line=0.2, solid=!$preview)
    makepoly(ldraw_lib__1_4cyli(solid), step=step, col=col, unit=unit, alt=alt, line=line, solid=solid);
ldraw_lib__1_4cyli(line=0.2);
// file: ../p/1-4chrd.scad
use <../lib.scad>
$fa=1; $fs=0.2;
function ldraw_lib__1_4chrd(realsolid=false) = [
// 0 Chord 0.25
// 0 Name: 1-4chrd.dat
// 0 Author: Tony Hafner [hafhead]
// 0 !LDRAW_ORG Primitive UPDATE 2012-02
// 0 !LICENSE Licensed under CC BY 2.0 and CC BY 4.0 : see CAreadme.txt
// 
// 0 BFC CERTIFY CCW
  [0,"BFC","CERTIFY"],
  [0,"BFC","CCW"],
// 
// 0 !HISTORY 2004-04-22 [PTadmin] Official Update 2004-02
// 0 !HISTORY 2007-10-09 [PTadmin] Header formatted for Contributor Agreement
// 0 !HISTORY 2008-07-01 [PTadmin] Official Update 2008-01
// 0 !HISTORY 2012-08-02 [MMR1988] Re-creation with PrimGen2 and Rectifier
// 0 !HISTORY 2012-08-09 [PTadmin] Official Update 2012-02
// 
// 
// 4 16 0.9239 0 0.3827 0.3827 0 0.9239 0 0 1 1 0 0
  [4,16,0.9239,0,0.3827,0.3827,0,0.9239,0,0,1,1,0,0],
// 3 16 0.7071 0 0.7071 0.3827 0 0.9239 0.9239 0 0.3827
  [3,16,0.7071,0,0.7071,0.3827,0,0.9239,0.9239,0,0.3827],
];
module ldraw_lib__1_4chrd(step=0, col=false, unit=2/5, alt=false, line=0.2, solid=!$preview)
    makepoly(ldraw_lib__1_4chrd(solid), step=step, col=col, unit=unit, alt=alt, line=line, solid=solid);
ldraw_lib__1_4chrd(line=0.2);
// main file
use <../lib.scad>
use <../p/1-4chrd.scad>
use <../p/1-4cyli.scad>
$fa=1; $fs=0.2;
function ldraw_lib__6009312c(realsolid=false) = [
// 0 Sticker  1.8 x  1 with Left Black Deflectors on Red Face
// 0 Name: 6009312c.dat
// 0 Author: Massimo Maso [Sirio]
// 0 !LDRAW_ORG Part UPDATE 2019-01
// 0 !LICENSE Licensed under CC BY 2.0 and CC BY 4.0 : see CAreadme.txt
// 
// 0 BFC CERTIFY CCW
  [0,"BFC","CERTIFY"],
  [0,"BFC","CCW"],
// 
// 0 !KEYWORDS Ferrari, Iveco, Polybag, Racers, Set 30191
// 
// 0 !HISTORY 2019-06-28 [PTadmin] Official Update 2019-01
// 
// 
// 0 // Primitives
// 
// 1 16 -7.66 0 16 0 0 -2 0 -1 0 2 0 0 1-4chrd.dat
  [1,16,-7.66,0,16,0,0,-2,0,-1,0,2,0,0, ldraw_lib__1_4chrd(realsolid)],
// 1 16 7.66 0 16 2 0 0 0 -1 0 0 0 2 1-4chrd.dat
  [1,16,7.66,0,16,2,0,0,0,-1,0,0,0,2, ldraw_lib__1_4chrd(realsolid)],
// 1 16 -7.66 0 -16 -2 0 0 0 -1 0 0 0 -2 1-4chrd.dat
  [1,16,-7.66,0,-16,-2,0,0,0,-1,0,0,0,-2, ldraw_lib__1_4chrd(realsolid)],
// 1 16 7.66 0 -16 0 0 2 0 -1 0 -2 0 0 1-4chrd.dat
  [1,16,7.66,0,-16,0,0,2,0,-1,0,-2,0,0, ldraw_lib__1_4chrd(realsolid)],
// 1 16 -7.66 -0.25 16 0 0 -2 0 0.25 0 2 0 0 1-4cyli.dat
  [1,16,-7.66,-0.25,16,0,0,-2,0,0.25,0,2,0,0, ldraw_lib__1_4cyli(realsolid)],
// 1 16 7.66 -0.25 16 2 0 0 0 0.25 0 0 0 2 1-4cyli.dat
  [1,16,7.66,-0.25,16,2,0,0,0,0.25,0,0,0,2, ldraw_lib__1_4cyli(realsolid)],
// 1 16 -7.66 -0.25 -16 -2 0 0 0 0.25 0 0 0 -2 1-4cyli.dat
  [1,16,-7.66,-0.25,-16,-2,0,0,0,0.25,0,0,0,-2, ldraw_lib__1_4cyli(realsolid)],
// 1 16 7.66 -0.25 -16 0 0 2 0 0.25 0 -2 0 0 1-4cyli.dat
  [1,16,7.66,-0.25,-16,0,0,2,0,0.25,0,-2,0,0, ldraw_lib__1_4cyli(realsolid)],
// 1 4 -7.66 -0.25 16 0 0 -2 0 1 0 2 0 0 1-4chrd.dat
  [1,4,-7.66,-0.25,16,0,0,-2,0,1,0,2,0,0, ldraw_lib__1_4chrd(realsolid)],
// 1 4 7.66 -0.25 16 2 0 0 0 1 0 0 0 2 1-4chrd.dat
  [1,4,7.66,-0.25,16,2,0,0,0,1,0,0,0,2, ldraw_lib__1_4chrd(realsolid)],
// 1 4 -7.66 -0.25 -16 -2 0 0 0 1 0 0 0 -2 1-4chrd.dat
  [1,4,-7.66,-0.25,-16,-2,0,0,0,1,0,0,0,-2, ldraw_lib__1_4chrd(realsolid)],
// 1 4 7.66 -0.25 -16 0 0 2 0 1 0 -2 0 0 1-4chrd.dat
  [1,4,7.66,-0.25,-16,0,0,2,0,1,0,-2,0,0, ldraw_lib__1_4chrd(realsolid)],
// 0 // Deflectors
// 3 0 3.45 -0.25 11.06 3.16 -0.25 11 5.66 -0.25 11
  [3,0,3.45,-0.25,11.06,3.16,-0.25,11,5.66,-0.25,11],
// 3 0 6.16 -0.25 -14.75 6.16 -0.25 14.75 5.66 -0.25 9.65
  [3,0,6.16,-0.25,-14.75,6.16,-0.25,14.75,5.66,-0.25,9.65],
// 3 0 5.66 -0.25 9.65 6.16 -0.25 14.75 5.66 -0.25 11
  [3,0,5.66,-0.25,9.65,6.16,-0.25,14.75,5.66,-0.25,11],
// 3 0 3.91 -0.25 11.75 3.86 -0.25 11.46 5.66 -0.25 11
  [3,0,3.91,-0.25,11.75,3.86,-0.25,11.46,5.66,-0.25,11],
// 3 0 5.66 -0.25 11 3.86 -0.25 11.46 3.69 -0.25 11.22
  [3,0,5.66,-0.25,11,3.86,-0.25,11.46,3.69,-0.25,11.22],
// 3 0 5.66 -0.25 11 3.69 -0.25 11.22 3.45 -0.25 11.06
  [3,0,5.66,-0.25,11,3.69,-0.25,11.22,3.45,-0.25,11.06],
// 3 0 5.66 -0.25 3.9 5.66 -0.25 2.55 6.16 -0.25 -14.75
  [3,0,5.66,-0.25,3.9,5.66,-0.25,2.55,6.16,-0.25,-14.75],
// 3 0 3.91 -0.25 4.65 3.86 -0.25 4.36 5.66 -0.25 3.9
  [3,0,3.91,-0.25,4.65,3.86,-0.25,4.36,5.66,-0.25,3.9],
// 3 0 3.86 -0.25 4.36 3.69 -0.25 4.12 5.66 -0.25 3.9
  [3,0,3.86,-0.25,4.36,3.69,-0.25,4.12,5.66,-0.25,3.9],
// 3 0 5.66 -0.25 3.9 3.69 -0.25 4.12 3.45 -0.25 3.96
  [3,0,5.66,-0.25,3.9,3.69,-0.25,4.12,3.45,-0.25,3.96],
// 3 0 5.66 -0.25 3.9 3.45 -0.25 3.96 3.16 -0.25 3.9
  [3,0,5.66,-0.25,3.9,3.45,-0.25,3.96,3.16,-0.25,3.9],
// 3 0 6.16 -0.25 -14.75 5.66 -0.25 9.65 5.66 -0.25 3.9
  [3,0,6.16,-0.25,-14.75,5.66,-0.25,9.65,5.66,-0.25,3.9],
// 4 0 5.66 -0.25 3.9 5.66 -0.25 9.65 3.91 -0.25 9.65 3.91 -0.25 4.65
  [4,0,5.66,-0.25,3.9,5.66,-0.25,9.65,3.91,-0.25,9.65,3.91,-0.25,4.65],
// 3 0 5.66 -0.25 -10.3 5.66 -0.25 -11.65 6.16 -0.25 -14.75
  [3,0,5.66,-0.25,-10.3,5.66,-0.25,-11.65,6.16,-0.25,-14.75],
// 4 0 5.66 -0.25 2.55 3.91 -0.25 2.55 3.91 -0.25 -2.45 5.66 -0.25 -3.2
  [4,0,5.66,-0.25,2.55,3.91,-0.25,2.55,3.91,-0.25,-2.45,5.66,-0.25,-3.2],
// 3 0 5.66 -0.25 -3.2 3.91 -0.25 -2.45 3.86 -0.25 -2.74
  [3,0,5.66,-0.25,-3.2,3.91,-0.25,-2.45,3.86,-0.25,-2.74],
// 3 0 3.86 -0.25 -2.74 3.69 -0.25 -2.98 5.66 -0.25 -3.2
  [3,0,3.86,-0.25,-2.74,3.69,-0.25,-2.98,5.66,-0.25,-3.2],
// 3 0 5.66 -0.25 -3.2 3.69 -0.25 -2.98 3.45 -0.25 -3.14
  [3,0,5.66,-0.25,-3.2,3.69,-0.25,-2.98,3.45,-0.25,-3.14],
// 3 0 5.66 -0.25 -3.2 3.45 -0.25 -3.14 3.16 -0.25 -3.2
  [3,0,5.66,-0.25,-3.2,3.45,-0.25,-3.14,3.16,-0.25,-3.2],
// 3 0 1.91 -0.25 15.75 2.3 -0.25 15.71 5.16 -0.25 15.75
  [3,0,1.91,-0.25,15.75,2.3,-0.25,15.71,5.16,-0.25,15.75],
// 3 0 5.16 -0.25 15.75 2.3 -0.25 15.71 2.68 -0.25 15.6
  [3,0,5.16,-0.25,15.75,2.3,-0.25,15.71,2.68,-0.25,15.6],
// 3 0 5.16 -0.25 15.75 2.68 -0.25 15.6 3.02 -0.25 15.41
  [3,0,5.16,-0.25,15.75,2.68,-0.25,15.6,3.02,-0.25,15.41],
// 3 0 3.91 -0.25 -9.55 3.86 -0.25 -9.84 5.66 -0.25 -10.3
  [3,0,3.91,-0.25,-9.55,3.86,-0.25,-9.84,5.66,-0.25,-10.3],
// 3 0 3.16 -0.25 -15.75 5.16 -0.25 -15.75 3.45 -0.25 -15.69
  [3,0,3.16,-0.25,-15.75,5.16,-0.25,-15.75,3.45,-0.25,-15.69],
// 3 0 3.45 -0.25 -15.69 5.16 -0.25 -15.75 3.69 -0.25 -15.53
  [3,0,3.45,-0.25,-15.69,5.16,-0.25,-15.75,3.69,-0.25,-15.53],
// 3 0 3.02 -0.25 15.41 3.33 -0.25 15.16 5.16 -0.25 15.75
  [3,0,3.02,-0.25,15.41,3.33,-0.25,15.16,5.16,-0.25,15.75],
// 3 0 5.16 -0.25 15.75 3.33 -0.25 15.16 3.58 -0.25 14.86
  [3,0,5.16,-0.25,15.75,3.33,-0.25,15.16,3.58,-0.25,14.86],
// 4 0 5.16 -0.25 15.75 3.58 -0.25 14.86 3.76 -0.25 14.52 5.55 -0.25 15.67
  [4,0,5.16,-0.25,15.75,3.58,-0.25,14.86,3.76,-0.25,14.52,5.55,-0.25,15.67],
// 3 0 3.91 -0.25 11.75 5.66 -0.25 11 3.91 -0.25 13.75
  [3,0,3.91,-0.25,11.75,5.66,-0.25,11,3.91,-0.25,13.75],
// 4 0 3.91 -0.25 13.75 5.66 -0.25 11 6.16 -0.25 14.75 3.88 -0.25 14.14
  [4,0,3.91,-0.25,13.75,5.66,-0.25,11,6.16,-0.25,14.75,3.88,-0.25,14.14],
// 4 0 3.88 -0.25 14.14 6.16 -0.25 14.75 6.09 -0.25 15.13 3.76 -0.25 14.52
  [4,0,3.88,-0.25,14.14,6.16,-0.25,14.75,6.09,-0.25,15.13,3.76,-0.25,14.52],
// 4 0 3.76 -0.25 14.52 6.09 -0.25 15.13 5.87 -0.25 15.46 5.55 -0.25 15.67
  [4,0,3.76,-0.25,14.52,6.09,-0.25,15.13,5.87,-0.25,15.46,5.55,-0.25,15.67],
// 3 0 5.66 -0.25 2.55 5.66 -0.25 -3.2 6.16 -0.25 -14.75
  [3,0,5.66,-0.25,2.55,5.66,-0.25,-3.2,6.16,-0.25,-14.75],
// 3 0 6.16 -0.25 -14.75 5.66 -0.25 -3.2 5.66 -0.25 -4.55
  [3,0,6.16,-0.25,-14.75,5.66,-0.25,-3.2,5.66,-0.25,-4.55],
// 3 0 6.16 -0.25 -14.75 5.66 -0.25 -4.55 5.66 -0.25 -10.3
  [3,0,6.16,-0.25,-14.75,5.66,-0.25,-4.55,5.66,-0.25,-10.3],
// 4 0 5.66 -0.25 -10.3 5.66 -0.25 -4.55 3.91 -0.25 -4.55 3.91 -0.25 -9.55
  [4,0,5.66,-0.25,-10.3,5.66,-0.25,-4.55,3.91,-0.25,-4.55,3.91,-0.25,-9.55],
// 3 0 3.86 -0.25 -9.84 3.69 -0.25 -10.08 5.66 -0.25 -10.3
  [3,0,3.86,-0.25,-9.84,3.69,-0.25,-10.08,5.66,-0.25,-10.3],
// 3 0 5.66 -0.25 -10.3 3.69 -0.25 -10.08 3.45 -0.25 -10.24
  [3,0,5.66,-0.25,-10.3,3.69,-0.25,-10.08,3.45,-0.25,-10.24],
// 3 0 5.66 -0.25 -10.3 3.45 -0.25 -10.24 3.16 -0.25 -10.3
  [3,0,5.66,-0.25,-10.3,3.45,-0.25,-10.24,3.16,-0.25,-10.3],
// 3 0 5.66 -0.25 -11.65 3.91 -0.25 -11.65 6.16 -0.25 -14.75
  [3,0,5.66,-0.25,-11.65,3.91,-0.25,-11.65,6.16,-0.25,-14.75],
// 4 0 6.16 -0.25 -14.75 3.91 -0.25 -11.65 3.91 -0.25 -15 6.09 -0.25 -15.13
  [4,0,6.16,-0.25,-14.75,3.91,-0.25,-11.65,3.91,-0.25,-15,6.09,-0.25,-15.13],
// 4 0 5.87 -0.25 -15.46 6.09 -0.25 -15.13 3.91 -0.25 -15 5.55 -0.25 -15.67
  [4,0,5.87,-0.25,-15.46,6.09,-0.25,-15.13,3.91,-0.25,-15,5.55,-0.25,-15.67],
// 4 0 5.55 -0.25 -15.67 3.91 -0.25 -15 3.86 -0.25 -15.29 5.16 -0.25 -15.75
  [4,0,5.55,-0.25,-15.67,3.91,-0.25,-15,3.86,-0.25,-15.29,5.16,-0.25,-15.75],
// 3 0 5.16 -0.25 -15.75 3.86 -0.25 -15.29 3.69 -0.25 -15.53
  [3,0,5.16,-0.25,-15.75,3.86,-0.25,-15.29,3.69,-0.25,-15.53],
// 0 // Surface
// 4 4 7.66 -0.25 18 -7.66 -0.25 18 -9.66 -0.25 16 1.91 -0.25 15.75
  [4,4,7.66,-0.25,18,-7.66,-0.25,18,-9.66,-0.25,16,1.91,-0.25,15.75],
// 4 4 9.66 -0.25 16 6.16 -0.25 14.75 6.16 -0.25 -14.75 9.66 -0.25 -16
  [4,4,9.66,-0.25,16,6.16,-0.25,14.75,6.16,-0.25,-14.75,9.66,-0.25,-16],
// 3 4 9.66 -0.25 -16 6.16 -0.25 -14.75 6.09 -0.25 -15.13
  [3,4,9.66,-0.25,-16,6.16,-0.25,-14.75,6.09,-0.25,-15.13],
// 4 4 9.66 -0.25 -16 6.09 -0.25 -15.13 5.87 -0.25 -15.46 7.66 -0.25 -18
  [4,4,9.66,-0.25,-16,6.09,-0.25,-15.13,5.87,-0.25,-15.46,7.66,-0.25,-18],
// 3 4 7.66 -0.25 -18 5.87 -0.25 -15.46 5.55 -0.25 -15.67
  [3,4,7.66,-0.25,-18,5.87,-0.25,-15.46,5.55,-0.25,-15.67],
// 4 4 5.66 -0.25 -11.65 5.66 -0.25 -10.3 3.16 -0.25 -10.3 3.91 -0.25 -11.65
  [4,4,5.66,-0.25,-11.65,5.66,-0.25,-10.3,3.16,-0.25,-10.3,3.91,-0.25,-11.65],
// 3 4 3.91 -0.25 -11.65 3.16 -0.25 -10.3 3.91 -0.25 -15
  [3,4,3.91,-0.25,-11.65,3.16,-0.25,-10.3,3.91,-0.25,-15],
// 3 4 5.16 -0.25 15.75 7.66 -0.25 18 1.91 -0.25 15.75
  [3,4,5.16,-0.25,15.75,7.66,-0.25,18,1.91,-0.25,15.75],
// 3 4 1.91 -0.25 15.75 -9.66 -0.25 16 3.16 -0.25 11
  [3,4,1.91,-0.25,15.75,-9.66,-0.25,16,3.16,-0.25,11],
// 3 4 5.16 -0.25 15.75 5.55 -0.25 15.67 7.66 -0.25 18
  [3,4,5.16,-0.25,15.75,5.55,-0.25,15.67,7.66,-0.25,18],
// 3 4 7.66 -0.25 18 5.55 -0.25 15.67 5.87 -0.25 15.46
  [3,4,7.66,-0.25,18,5.55,-0.25,15.67,5.87,-0.25,15.46],
// 4 4 7.66 -0.25 18 5.87 -0.25 15.46 6.09 -0.25 15.13 9.66 -0.25 16
  [4,4,7.66,-0.25,18,5.87,-0.25,15.46,6.09,-0.25,15.13,9.66,-0.25,16],
// 3 4 9.66 -0.25 16 6.09 -0.25 15.13 6.16 -0.25 14.75
  [3,4,9.66,-0.25,16,6.09,-0.25,15.13,6.16,-0.25,14.75],
// 3 4 5.55 -0.25 -15.67 5.16 -0.25 -15.75 7.66 -0.25 -18
  [3,4,5.55,-0.25,-15.67,5.16,-0.25,-15.75,7.66,-0.25,-18],
// 3 4 7.66 -0.25 -18 5.16 -0.25 -15.75 3.16 -0.25 -15.75
  [3,4,7.66,-0.25,-18,5.16,-0.25,-15.75,3.16,-0.25,-15.75],
// 3 4 7.66 -0.25 -18 3.16 -0.25 -15.75 -7.66 -0.25 -18
  [3,4,7.66,-0.25,-18,3.16,-0.25,-15.75,-7.66,-0.25,-18],
// 4 4 3.91 -0.25 2.55 5.66 -0.25 2.55 5.66 -0.25 3.9 3.16 -0.25 3.9
  [4,4,3.91,-0.25,2.55,5.66,-0.25,2.55,5.66,-0.25,3.9,3.16,-0.25,3.9],
// 3 4 3.16 -0.25 11 3.45 -0.25 11.06 3.69 -0.25 11.22
  [3,4,3.16,-0.25,11,3.45,-0.25,11.06,3.69,-0.25,11.22],
// 4 4 3.16 -0.25 3.9 3.45 -0.25 3.96 3.69 -0.25 4.12 -9.66 -0.25 16
  [4,4,3.16,-0.25,3.9,3.45,-0.25,3.96,3.69,-0.25,4.12,-9.66,-0.25,16],
// 4 4 3.69 -0.25 11.22 3.86 -0.25 11.46 3.91 -0.25 11.75 3.16 -0.25 11
  [4,4,3.69,-0.25,11.22,3.86,-0.25,11.46,3.91,-0.25,11.75,3.16,-0.25,11],
// 4 4 3.16 -0.25 11 3.91 -0.25 11.75 3.91 -0.25 13.75 1.91 -0.25 15.75
  [4,4,3.16,-0.25,11,3.91,-0.25,11.75,3.91,-0.25,13.75,1.91,-0.25,15.75],
// 3 4 1.91 -0.25 15.75 3.91 -0.25 13.75 3.88 -0.25 14.14
  [3,4,1.91,-0.25,15.75,3.91,-0.25,13.75,3.88,-0.25,14.14],
// 3 4 2.68 -0.25 15.6 3.58 -0.25 14.86 3.02 -0.25 15.41
  [3,4,2.68,-0.25,15.6,3.58,-0.25,14.86,3.02,-0.25,15.41],
// 3 4 3.02 -0.25 15.41 3.58 -0.25 14.86 3.33 -0.25 15.16
  [3,4,3.02,-0.25,15.41,3.58,-0.25,14.86,3.33,-0.25,15.16],
// 3 4 3.88 -0.25 14.14 3.76 -0.25 14.52 1.91 -0.25 15.75
  [3,4,3.88,-0.25,14.14,3.76,-0.25,14.52,1.91,-0.25,15.75],
// 4 4 1.91 -0.25 15.75 3.76 -0.25 14.52 3.58 -0.25 14.86 2.3 -0.25 15.71
  [4,4,1.91,-0.25,15.75,3.76,-0.25,14.52,3.58,-0.25,14.86,2.3,-0.25,15.71],
// 3 4 2.3 -0.25 15.71 3.58 -0.25 14.86 2.68 -0.25 15.6
  [3,4,2.3,-0.25,15.71,3.58,-0.25,14.86,2.68,-0.25,15.6],
// 4 4 3.69 -0.25 -15.53 3.86 -0.25 -15.29 3.91 -0.25 -15 3.45 -0.25 -15.69
  [4,4,3.69,-0.25,-15.53,3.86,-0.25,-15.29,3.91,-0.25,-15,3.45,-0.25,-15.69],
// 4 4 3.45 -0.25 -15.69 3.91 -0.25 -15 3.16 -0.25 -10.3 3.16 -0.25 -15.75
  [4,4,3.45,-0.25,-15.69,3.91,-0.25,-15,3.16,-0.25,-10.3,3.16,-0.25,-15.75],
// 4 4 5.66 -0.25 -4.55 5.66 -0.25 -3.2 3.16 -0.25 -3.2 3.91 -0.25 -4.55
  [4,4,5.66,-0.25,-4.55,5.66,-0.25,-3.2,3.16,-0.25,-3.2,3.91,-0.25,-4.55],
// 3 4 3.91 -0.25 -4.55 3.16 -0.25 -3.2 3.91 -0.25 -9.55
  [3,4,3.91,-0.25,-4.55,3.16,-0.25,-3.2,3.91,-0.25,-9.55],
// 4 4 3.91 -0.25 -9.55 3.16 -0.25 -3.2 3.16 -0.25 -10.3 3.45 -0.25 -10.24
  [4,4,3.91,-0.25,-9.55,3.16,-0.25,-3.2,3.16,-0.25,-10.3,3.45,-0.25,-10.24],
// 4 4 5.66 -0.25 9.65 5.66 -0.25 11 3.16 -0.25 11 3.91 -0.25 9.65
  [4,4,5.66,-0.25,9.65,5.66,-0.25,11,3.16,-0.25,11,3.91,-0.25,9.65],
// 4 4 3.91 -0.25 9.65 3.16 -0.25 11 -9.66 -0.25 16 3.91 -0.25 4.65
  [4,4,3.91,-0.25,9.65,3.16,-0.25,11,-9.66,-0.25,16,3.91,-0.25,4.65],
// 4 4 3.91 -0.25 4.65 -9.66 -0.25 16 3.69 -0.25 4.12 3.86 -0.25 4.36
  [4,4,3.91,-0.25,4.65,-9.66,-0.25,16,3.69,-0.25,4.12,3.86,-0.25,4.36],
// 4 4 3.91 -0.25 -9.55 3.45 -0.25 -10.24 3.69 -0.25 -10.08 3.86 -0.25 -9.84
  [4,4,3.91,-0.25,-9.55,3.45,-0.25,-10.24,3.69,-0.25,-10.08,3.86,-0.25,-9.84],
// 4 4 -7.66 -0.25 -18 3.16 -0.25 -15.75 3.16 -0.25 -10.3 -9.66 -0.25 -16
  [4,4,-7.66,-0.25,-18,3.16,-0.25,-15.75,3.16,-0.25,-10.3,-9.66,-0.25,-16],
// 4 4 -9.66 -0.25 -16 3.16 -0.25 -10.3 3.16 -0.25 -3.2 -9.66 -0.25 16
  [4,4,-9.66,-0.25,-16,3.16,-0.25,-10.3,3.16,-0.25,-3.2,-9.66,-0.25,16],
// 4 4 -9.66 -0.25 16 3.16 -0.25 -3.2 3.45 -0.25 -3.14 3.69 -0.25 -2.98
  [4,4,-9.66,-0.25,16,3.16,-0.25,-3.2,3.45,-0.25,-3.14,3.69,-0.25,-2.98],
// 4 4 3.91 -0.25 2.55 3.16 -0.25 3.9 -9.66 -0.25 16 3.91 -0.25 -2.45
  [4,4,3.91,-0.25,2.55,3.16,-0.25,3.9,-9.66,-0.25,16,3.91,-0.25,-2.45],
// 4 4 3.91 -0.25 -2.45 -9.66 -0.25 16 3.69 -0.25 -2.98 3.86 -0.25 -2.74
  [4,4,3.91,-0.25,-2.45,-9.66,-0.25,16,3.69,-0.25,-2.98,3.86,-0.25,-2.74],
// 0 // Neutral lateral surface
// 4 16 -7.66 0 18 -7.66 -0.25 18 7.66 -0.25 18 7.66 0 18
  [4,16,-7.66,0,18,-7.66,-0.25,18,7.66,-0.25,18,7.66,0,18],
// 4 16 -9.66 0 -16 -9.66 -0.25 -16 -9.66 -0.25 16 -9.66 0 16
  [4,16,-9.66,0,-16,-9.66,-0.25,-16,-9.66,-0.25,16,-9.66,0,16],
// 4 16 9.66 0 16 9.66 -0.25 16 9.66 -0.25 -16 9.66 0 -16
  [4,16,9.66,0,16,9.66,-0.25,16,9.66,-0.25,-16,9.66,0,-16],
// 4 16 7.66 0 -18 7.66 -0.25 -18 -7.66 -0.25 -18 -7.66 0 -18
  [4,16,7.66,0,-18,7.66,-0.25,-18,-7.66,-0.25,-18,-7.66,0,-18],
// 0 // Neutral bottom surface
// 4 16 9.66 0 16 -9.66 0 16 -7.66 0 18 7.66 0 18
  [4,16,9.66,0,16,-9.66,0,16,-7.66,0,18,7.66,0,18],
// 4 16 -9.66 0 16 9.66 0 16 9.66 0 -16 -9.66 0 -16
  [4,16,-9.66,0,16,9.66,0,16,9.66,0,-16,-9.66,0,-16],
// 4 16 7.66 0 -18 -7.66 0 -18 -9.66 0 -16 9.66 0 -16
  [4,16,7.66,0,-18,-7.66,0,-18,-9.66,0,-16,9.66,0,-16],
];
module ldraw_lib__6009312c(step=0, col=false, unit=2/5, alt=false, line=0.2, solid=!$preview)
    makepoly(ldraw_lib__6009312c(solid), step=step, col=col, unit=unit, alt=alt, line=line, solid=solid);
ldraw_lib__6009312c(line=0.2);
